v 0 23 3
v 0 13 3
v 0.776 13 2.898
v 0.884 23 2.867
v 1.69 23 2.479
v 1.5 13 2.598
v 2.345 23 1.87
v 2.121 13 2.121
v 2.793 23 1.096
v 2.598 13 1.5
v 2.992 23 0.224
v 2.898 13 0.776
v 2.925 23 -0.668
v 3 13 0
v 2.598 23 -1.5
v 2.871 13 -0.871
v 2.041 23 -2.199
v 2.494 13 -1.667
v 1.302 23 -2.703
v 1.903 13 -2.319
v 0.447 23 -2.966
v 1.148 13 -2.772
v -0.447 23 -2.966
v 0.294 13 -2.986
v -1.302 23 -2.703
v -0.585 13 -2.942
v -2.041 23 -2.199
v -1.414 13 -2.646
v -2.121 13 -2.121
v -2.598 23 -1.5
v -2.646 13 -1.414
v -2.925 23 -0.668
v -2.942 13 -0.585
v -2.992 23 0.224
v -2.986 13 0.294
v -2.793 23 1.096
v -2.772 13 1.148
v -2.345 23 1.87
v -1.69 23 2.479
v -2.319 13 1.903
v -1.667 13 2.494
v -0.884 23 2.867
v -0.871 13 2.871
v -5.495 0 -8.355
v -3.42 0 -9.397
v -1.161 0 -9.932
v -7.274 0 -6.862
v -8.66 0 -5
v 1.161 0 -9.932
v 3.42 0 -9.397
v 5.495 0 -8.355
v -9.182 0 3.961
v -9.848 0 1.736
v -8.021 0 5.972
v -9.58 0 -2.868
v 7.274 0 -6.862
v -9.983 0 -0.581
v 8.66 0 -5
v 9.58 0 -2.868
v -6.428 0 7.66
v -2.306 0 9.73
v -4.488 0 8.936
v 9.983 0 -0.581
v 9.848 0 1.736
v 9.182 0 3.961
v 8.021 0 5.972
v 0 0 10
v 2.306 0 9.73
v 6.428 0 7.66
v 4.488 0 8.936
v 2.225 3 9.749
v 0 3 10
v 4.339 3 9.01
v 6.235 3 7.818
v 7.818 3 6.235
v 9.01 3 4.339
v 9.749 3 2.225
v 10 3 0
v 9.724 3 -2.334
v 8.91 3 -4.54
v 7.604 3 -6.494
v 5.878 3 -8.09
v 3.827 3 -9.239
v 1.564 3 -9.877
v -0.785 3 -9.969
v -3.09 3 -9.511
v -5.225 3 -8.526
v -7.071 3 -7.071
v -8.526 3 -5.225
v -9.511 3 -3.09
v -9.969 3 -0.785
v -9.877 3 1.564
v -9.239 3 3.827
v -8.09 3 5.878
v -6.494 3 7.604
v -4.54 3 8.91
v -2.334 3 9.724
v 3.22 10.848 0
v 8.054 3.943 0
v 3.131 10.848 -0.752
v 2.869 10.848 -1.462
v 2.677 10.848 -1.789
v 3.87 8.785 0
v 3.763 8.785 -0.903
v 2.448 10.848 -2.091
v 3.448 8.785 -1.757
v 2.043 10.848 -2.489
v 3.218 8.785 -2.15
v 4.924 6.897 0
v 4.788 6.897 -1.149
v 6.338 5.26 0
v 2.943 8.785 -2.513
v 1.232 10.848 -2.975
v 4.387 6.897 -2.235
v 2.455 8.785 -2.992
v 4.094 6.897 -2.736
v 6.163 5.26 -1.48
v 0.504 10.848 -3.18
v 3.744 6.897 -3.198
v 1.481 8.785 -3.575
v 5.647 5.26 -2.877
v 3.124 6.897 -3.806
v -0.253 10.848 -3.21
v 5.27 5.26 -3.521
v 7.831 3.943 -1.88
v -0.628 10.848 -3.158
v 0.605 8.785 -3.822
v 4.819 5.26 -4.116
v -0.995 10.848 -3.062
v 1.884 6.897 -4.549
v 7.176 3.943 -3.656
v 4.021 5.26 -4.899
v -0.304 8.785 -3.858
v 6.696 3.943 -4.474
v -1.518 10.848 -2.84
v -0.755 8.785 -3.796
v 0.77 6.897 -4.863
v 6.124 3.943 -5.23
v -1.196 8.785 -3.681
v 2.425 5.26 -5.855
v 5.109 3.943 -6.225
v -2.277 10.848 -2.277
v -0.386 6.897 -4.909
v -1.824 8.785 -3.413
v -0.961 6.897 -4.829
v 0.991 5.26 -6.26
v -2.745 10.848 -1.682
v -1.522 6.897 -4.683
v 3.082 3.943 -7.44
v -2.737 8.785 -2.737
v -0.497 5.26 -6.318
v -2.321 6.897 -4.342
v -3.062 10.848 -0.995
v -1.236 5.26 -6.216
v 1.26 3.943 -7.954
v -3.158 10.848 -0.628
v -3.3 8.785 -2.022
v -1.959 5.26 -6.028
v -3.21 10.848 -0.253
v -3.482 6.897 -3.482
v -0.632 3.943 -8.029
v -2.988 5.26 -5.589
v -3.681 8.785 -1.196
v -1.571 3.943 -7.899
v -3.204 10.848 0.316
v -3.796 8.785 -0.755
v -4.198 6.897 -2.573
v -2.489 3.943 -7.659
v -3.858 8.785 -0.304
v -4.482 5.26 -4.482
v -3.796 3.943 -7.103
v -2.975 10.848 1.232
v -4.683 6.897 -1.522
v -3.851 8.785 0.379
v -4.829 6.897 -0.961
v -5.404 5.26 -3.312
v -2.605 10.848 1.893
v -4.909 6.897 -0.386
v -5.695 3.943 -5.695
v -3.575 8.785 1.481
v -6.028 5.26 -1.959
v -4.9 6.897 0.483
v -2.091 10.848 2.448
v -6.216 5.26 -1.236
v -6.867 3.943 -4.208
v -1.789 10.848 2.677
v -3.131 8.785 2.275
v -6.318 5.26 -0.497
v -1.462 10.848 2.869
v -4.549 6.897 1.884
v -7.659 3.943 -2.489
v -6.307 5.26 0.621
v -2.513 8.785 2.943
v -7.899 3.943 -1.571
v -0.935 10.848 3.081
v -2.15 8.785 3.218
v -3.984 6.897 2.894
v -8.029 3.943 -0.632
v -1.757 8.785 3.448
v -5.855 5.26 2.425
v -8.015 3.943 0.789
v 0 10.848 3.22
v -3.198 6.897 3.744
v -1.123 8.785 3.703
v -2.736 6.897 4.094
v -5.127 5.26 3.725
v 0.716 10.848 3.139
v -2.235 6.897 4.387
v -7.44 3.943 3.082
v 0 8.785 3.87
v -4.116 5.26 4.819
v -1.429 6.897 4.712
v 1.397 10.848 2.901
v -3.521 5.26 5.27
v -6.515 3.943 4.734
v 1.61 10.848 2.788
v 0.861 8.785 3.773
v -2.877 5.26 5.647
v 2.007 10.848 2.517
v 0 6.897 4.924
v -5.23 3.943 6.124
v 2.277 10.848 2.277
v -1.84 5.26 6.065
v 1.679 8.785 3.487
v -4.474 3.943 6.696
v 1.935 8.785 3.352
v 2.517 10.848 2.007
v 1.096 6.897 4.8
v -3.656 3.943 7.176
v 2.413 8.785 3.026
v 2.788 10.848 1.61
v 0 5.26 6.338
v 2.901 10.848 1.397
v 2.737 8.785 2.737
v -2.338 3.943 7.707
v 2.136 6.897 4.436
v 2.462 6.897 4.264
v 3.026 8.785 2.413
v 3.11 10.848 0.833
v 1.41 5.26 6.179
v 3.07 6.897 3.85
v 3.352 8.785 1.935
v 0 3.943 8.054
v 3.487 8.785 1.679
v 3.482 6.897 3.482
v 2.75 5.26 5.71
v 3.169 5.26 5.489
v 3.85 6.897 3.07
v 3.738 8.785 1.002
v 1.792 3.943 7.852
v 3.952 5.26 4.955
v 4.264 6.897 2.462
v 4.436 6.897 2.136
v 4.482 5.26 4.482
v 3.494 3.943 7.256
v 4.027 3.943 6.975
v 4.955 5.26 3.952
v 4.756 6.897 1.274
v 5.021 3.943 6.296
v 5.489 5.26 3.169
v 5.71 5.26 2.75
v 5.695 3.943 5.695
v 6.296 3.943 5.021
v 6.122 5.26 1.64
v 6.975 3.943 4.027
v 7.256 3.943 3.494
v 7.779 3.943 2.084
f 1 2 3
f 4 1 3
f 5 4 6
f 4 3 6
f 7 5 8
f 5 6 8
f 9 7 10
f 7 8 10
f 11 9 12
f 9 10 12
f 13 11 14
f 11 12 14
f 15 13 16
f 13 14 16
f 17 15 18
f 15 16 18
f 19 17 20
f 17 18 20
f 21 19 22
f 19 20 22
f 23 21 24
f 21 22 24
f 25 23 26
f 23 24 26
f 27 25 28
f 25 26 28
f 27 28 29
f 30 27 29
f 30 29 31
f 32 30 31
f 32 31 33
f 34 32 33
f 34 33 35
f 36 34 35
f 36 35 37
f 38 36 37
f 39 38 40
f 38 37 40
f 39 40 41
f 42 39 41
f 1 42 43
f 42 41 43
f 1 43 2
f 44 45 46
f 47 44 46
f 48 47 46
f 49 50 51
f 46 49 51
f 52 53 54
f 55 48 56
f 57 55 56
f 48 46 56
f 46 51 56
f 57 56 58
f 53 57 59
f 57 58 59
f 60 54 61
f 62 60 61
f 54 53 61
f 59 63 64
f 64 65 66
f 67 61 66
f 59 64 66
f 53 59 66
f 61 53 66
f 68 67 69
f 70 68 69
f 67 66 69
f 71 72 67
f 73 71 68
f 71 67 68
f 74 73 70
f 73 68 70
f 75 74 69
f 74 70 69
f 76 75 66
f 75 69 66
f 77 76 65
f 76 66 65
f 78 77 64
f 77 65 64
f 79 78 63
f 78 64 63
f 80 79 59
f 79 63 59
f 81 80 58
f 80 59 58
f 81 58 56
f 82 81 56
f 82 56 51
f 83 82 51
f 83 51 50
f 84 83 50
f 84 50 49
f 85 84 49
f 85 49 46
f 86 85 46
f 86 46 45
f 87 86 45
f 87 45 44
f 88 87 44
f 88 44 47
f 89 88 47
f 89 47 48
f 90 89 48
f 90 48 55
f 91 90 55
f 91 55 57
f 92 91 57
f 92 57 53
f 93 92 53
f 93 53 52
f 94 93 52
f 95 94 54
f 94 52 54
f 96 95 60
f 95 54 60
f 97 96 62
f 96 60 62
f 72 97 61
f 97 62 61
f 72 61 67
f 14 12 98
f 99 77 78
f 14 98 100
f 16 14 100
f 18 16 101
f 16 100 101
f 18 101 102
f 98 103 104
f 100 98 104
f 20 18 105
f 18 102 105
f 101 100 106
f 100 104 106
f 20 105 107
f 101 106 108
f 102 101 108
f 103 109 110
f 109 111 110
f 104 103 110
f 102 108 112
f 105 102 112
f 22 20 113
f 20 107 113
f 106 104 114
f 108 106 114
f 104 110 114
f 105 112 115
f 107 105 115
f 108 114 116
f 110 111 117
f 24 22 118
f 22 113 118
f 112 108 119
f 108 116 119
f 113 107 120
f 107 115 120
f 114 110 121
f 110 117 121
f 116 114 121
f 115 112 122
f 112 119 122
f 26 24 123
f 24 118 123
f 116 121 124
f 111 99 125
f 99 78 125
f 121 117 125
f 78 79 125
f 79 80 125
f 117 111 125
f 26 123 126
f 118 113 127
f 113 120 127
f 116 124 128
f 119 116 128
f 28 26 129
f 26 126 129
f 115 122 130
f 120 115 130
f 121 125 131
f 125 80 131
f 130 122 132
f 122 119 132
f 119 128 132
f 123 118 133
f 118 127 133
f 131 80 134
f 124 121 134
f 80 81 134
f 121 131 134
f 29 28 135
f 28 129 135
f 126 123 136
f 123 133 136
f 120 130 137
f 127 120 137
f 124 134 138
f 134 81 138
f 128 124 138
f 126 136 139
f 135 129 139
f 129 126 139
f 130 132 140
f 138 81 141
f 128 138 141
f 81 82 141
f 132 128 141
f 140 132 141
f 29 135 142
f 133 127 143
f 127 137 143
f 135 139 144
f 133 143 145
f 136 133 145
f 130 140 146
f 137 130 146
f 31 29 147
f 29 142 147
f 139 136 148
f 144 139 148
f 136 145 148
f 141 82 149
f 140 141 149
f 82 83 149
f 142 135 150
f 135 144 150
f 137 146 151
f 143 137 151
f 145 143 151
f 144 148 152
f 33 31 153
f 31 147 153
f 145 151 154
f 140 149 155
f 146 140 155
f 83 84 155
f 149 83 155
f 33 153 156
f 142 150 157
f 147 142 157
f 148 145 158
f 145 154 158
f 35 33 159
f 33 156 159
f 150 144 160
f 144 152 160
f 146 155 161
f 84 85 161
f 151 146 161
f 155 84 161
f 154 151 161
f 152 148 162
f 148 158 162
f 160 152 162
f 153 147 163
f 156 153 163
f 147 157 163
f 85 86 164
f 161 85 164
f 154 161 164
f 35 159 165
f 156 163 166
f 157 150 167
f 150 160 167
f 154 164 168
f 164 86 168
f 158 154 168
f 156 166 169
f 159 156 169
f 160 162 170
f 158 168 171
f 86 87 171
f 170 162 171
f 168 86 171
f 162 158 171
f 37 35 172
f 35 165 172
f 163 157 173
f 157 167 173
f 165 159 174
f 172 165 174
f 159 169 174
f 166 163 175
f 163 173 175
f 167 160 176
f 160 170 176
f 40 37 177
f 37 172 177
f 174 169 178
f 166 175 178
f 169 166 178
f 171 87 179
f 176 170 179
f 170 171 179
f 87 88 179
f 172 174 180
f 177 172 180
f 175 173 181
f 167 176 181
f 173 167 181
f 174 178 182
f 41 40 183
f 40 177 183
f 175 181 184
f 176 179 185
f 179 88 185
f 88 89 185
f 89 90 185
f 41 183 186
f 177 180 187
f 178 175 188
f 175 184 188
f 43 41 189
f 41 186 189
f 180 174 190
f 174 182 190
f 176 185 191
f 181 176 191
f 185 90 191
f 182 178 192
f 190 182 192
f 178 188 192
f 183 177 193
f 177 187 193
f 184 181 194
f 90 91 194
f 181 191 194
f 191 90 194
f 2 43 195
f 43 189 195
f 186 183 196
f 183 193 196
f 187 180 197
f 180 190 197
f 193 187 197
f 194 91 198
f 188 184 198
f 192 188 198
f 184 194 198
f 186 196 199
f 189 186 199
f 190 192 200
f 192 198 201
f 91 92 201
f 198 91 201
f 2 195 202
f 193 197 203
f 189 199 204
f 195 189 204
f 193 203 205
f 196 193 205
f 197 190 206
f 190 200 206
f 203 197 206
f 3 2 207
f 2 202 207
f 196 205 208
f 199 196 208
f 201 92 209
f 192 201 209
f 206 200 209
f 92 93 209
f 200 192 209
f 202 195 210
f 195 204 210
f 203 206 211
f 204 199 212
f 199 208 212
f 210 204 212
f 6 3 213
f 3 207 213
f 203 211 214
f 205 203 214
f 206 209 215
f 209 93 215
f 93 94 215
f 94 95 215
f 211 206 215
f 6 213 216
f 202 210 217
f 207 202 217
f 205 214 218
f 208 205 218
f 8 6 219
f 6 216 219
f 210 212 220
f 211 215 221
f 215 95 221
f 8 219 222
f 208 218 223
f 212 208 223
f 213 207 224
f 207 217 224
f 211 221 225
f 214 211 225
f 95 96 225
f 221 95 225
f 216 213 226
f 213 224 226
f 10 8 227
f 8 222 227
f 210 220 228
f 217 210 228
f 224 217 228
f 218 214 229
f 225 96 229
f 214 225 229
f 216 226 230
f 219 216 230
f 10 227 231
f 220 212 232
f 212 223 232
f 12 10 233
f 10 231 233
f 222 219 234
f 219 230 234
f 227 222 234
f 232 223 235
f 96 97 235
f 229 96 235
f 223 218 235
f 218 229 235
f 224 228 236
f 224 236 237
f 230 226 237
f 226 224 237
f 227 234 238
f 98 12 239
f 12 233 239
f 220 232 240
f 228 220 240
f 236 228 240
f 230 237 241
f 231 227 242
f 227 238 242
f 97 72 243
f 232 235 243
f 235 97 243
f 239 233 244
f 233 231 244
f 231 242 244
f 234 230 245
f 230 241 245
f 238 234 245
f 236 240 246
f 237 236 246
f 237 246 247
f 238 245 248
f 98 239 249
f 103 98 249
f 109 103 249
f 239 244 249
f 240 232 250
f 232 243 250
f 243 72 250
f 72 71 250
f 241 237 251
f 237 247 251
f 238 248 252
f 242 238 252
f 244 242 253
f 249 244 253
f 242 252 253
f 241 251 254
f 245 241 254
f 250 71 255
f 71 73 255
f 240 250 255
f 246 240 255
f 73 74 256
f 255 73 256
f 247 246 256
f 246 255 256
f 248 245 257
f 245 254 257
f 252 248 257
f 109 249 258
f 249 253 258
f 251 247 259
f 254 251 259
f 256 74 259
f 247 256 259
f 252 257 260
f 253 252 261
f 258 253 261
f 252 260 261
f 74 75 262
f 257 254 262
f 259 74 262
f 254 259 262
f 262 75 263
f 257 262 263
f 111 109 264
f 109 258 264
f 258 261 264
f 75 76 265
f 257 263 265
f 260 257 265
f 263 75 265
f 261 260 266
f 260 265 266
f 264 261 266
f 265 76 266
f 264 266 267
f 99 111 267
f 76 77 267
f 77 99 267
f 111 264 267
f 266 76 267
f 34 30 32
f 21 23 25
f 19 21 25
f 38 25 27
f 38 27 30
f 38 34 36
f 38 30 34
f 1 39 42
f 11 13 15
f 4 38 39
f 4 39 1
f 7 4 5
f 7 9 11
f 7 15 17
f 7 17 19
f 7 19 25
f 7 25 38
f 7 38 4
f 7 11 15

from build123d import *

# Parameters (mm, degrees)
SKETCH_1_R      = 10
EXTRUDE_1_DEPTH = 3
SKETCH_2_R      = 3
EXTRUDE_2_DEPTH = 20


with BuildPart() as part:
    # 草图1 → 凸台-拉伸1 (new body)
    with BuildSketch(Plane(origin=(0, 0, 0), x_dir=(1, 0, 0), z_dir=(0, 1, 0))):
        with Locations(Location((0, 0, 0), (0, 0, 270))):
            Circle(SKETCH_1_R)
    extrude(amount=EXTRUDE_1_DEPTH)

    # 草图2 → 凸台-拉伸2 (add)
    with BuildSketch(Plane(origin=(0, 3, 0), x_dir=(1, 0, 0), z_dir=(0, 1, 0))):
        with Locations(Location((0, 0, 0), (0, 0, 270))):
            Circle(SKETCH_2_R)
    extrude(amount=EXTRUDE_2_DEPTH)

    # 草图3 → 旋转2 (revolve)
    with BuildSketch(Plane.XY, mode=Mode.PRIVATE) as revolve_2_sk:
        with BuildLine():
            Line((-10, 3), (-3, 3))
            Line((-3, 3), (-3, 13))
            ThreePointArc((-3, 13), (-4.923888846, 6.896722192), (-10, 3))
        make_face()
    revolve(revolve_2_sk.sketch.rotate(Axis((0, -1000, 0), (0, 1, 0)), 180), axis=Axis((0, -1000, 0), (0, 1, 0)))


solid = part.part
